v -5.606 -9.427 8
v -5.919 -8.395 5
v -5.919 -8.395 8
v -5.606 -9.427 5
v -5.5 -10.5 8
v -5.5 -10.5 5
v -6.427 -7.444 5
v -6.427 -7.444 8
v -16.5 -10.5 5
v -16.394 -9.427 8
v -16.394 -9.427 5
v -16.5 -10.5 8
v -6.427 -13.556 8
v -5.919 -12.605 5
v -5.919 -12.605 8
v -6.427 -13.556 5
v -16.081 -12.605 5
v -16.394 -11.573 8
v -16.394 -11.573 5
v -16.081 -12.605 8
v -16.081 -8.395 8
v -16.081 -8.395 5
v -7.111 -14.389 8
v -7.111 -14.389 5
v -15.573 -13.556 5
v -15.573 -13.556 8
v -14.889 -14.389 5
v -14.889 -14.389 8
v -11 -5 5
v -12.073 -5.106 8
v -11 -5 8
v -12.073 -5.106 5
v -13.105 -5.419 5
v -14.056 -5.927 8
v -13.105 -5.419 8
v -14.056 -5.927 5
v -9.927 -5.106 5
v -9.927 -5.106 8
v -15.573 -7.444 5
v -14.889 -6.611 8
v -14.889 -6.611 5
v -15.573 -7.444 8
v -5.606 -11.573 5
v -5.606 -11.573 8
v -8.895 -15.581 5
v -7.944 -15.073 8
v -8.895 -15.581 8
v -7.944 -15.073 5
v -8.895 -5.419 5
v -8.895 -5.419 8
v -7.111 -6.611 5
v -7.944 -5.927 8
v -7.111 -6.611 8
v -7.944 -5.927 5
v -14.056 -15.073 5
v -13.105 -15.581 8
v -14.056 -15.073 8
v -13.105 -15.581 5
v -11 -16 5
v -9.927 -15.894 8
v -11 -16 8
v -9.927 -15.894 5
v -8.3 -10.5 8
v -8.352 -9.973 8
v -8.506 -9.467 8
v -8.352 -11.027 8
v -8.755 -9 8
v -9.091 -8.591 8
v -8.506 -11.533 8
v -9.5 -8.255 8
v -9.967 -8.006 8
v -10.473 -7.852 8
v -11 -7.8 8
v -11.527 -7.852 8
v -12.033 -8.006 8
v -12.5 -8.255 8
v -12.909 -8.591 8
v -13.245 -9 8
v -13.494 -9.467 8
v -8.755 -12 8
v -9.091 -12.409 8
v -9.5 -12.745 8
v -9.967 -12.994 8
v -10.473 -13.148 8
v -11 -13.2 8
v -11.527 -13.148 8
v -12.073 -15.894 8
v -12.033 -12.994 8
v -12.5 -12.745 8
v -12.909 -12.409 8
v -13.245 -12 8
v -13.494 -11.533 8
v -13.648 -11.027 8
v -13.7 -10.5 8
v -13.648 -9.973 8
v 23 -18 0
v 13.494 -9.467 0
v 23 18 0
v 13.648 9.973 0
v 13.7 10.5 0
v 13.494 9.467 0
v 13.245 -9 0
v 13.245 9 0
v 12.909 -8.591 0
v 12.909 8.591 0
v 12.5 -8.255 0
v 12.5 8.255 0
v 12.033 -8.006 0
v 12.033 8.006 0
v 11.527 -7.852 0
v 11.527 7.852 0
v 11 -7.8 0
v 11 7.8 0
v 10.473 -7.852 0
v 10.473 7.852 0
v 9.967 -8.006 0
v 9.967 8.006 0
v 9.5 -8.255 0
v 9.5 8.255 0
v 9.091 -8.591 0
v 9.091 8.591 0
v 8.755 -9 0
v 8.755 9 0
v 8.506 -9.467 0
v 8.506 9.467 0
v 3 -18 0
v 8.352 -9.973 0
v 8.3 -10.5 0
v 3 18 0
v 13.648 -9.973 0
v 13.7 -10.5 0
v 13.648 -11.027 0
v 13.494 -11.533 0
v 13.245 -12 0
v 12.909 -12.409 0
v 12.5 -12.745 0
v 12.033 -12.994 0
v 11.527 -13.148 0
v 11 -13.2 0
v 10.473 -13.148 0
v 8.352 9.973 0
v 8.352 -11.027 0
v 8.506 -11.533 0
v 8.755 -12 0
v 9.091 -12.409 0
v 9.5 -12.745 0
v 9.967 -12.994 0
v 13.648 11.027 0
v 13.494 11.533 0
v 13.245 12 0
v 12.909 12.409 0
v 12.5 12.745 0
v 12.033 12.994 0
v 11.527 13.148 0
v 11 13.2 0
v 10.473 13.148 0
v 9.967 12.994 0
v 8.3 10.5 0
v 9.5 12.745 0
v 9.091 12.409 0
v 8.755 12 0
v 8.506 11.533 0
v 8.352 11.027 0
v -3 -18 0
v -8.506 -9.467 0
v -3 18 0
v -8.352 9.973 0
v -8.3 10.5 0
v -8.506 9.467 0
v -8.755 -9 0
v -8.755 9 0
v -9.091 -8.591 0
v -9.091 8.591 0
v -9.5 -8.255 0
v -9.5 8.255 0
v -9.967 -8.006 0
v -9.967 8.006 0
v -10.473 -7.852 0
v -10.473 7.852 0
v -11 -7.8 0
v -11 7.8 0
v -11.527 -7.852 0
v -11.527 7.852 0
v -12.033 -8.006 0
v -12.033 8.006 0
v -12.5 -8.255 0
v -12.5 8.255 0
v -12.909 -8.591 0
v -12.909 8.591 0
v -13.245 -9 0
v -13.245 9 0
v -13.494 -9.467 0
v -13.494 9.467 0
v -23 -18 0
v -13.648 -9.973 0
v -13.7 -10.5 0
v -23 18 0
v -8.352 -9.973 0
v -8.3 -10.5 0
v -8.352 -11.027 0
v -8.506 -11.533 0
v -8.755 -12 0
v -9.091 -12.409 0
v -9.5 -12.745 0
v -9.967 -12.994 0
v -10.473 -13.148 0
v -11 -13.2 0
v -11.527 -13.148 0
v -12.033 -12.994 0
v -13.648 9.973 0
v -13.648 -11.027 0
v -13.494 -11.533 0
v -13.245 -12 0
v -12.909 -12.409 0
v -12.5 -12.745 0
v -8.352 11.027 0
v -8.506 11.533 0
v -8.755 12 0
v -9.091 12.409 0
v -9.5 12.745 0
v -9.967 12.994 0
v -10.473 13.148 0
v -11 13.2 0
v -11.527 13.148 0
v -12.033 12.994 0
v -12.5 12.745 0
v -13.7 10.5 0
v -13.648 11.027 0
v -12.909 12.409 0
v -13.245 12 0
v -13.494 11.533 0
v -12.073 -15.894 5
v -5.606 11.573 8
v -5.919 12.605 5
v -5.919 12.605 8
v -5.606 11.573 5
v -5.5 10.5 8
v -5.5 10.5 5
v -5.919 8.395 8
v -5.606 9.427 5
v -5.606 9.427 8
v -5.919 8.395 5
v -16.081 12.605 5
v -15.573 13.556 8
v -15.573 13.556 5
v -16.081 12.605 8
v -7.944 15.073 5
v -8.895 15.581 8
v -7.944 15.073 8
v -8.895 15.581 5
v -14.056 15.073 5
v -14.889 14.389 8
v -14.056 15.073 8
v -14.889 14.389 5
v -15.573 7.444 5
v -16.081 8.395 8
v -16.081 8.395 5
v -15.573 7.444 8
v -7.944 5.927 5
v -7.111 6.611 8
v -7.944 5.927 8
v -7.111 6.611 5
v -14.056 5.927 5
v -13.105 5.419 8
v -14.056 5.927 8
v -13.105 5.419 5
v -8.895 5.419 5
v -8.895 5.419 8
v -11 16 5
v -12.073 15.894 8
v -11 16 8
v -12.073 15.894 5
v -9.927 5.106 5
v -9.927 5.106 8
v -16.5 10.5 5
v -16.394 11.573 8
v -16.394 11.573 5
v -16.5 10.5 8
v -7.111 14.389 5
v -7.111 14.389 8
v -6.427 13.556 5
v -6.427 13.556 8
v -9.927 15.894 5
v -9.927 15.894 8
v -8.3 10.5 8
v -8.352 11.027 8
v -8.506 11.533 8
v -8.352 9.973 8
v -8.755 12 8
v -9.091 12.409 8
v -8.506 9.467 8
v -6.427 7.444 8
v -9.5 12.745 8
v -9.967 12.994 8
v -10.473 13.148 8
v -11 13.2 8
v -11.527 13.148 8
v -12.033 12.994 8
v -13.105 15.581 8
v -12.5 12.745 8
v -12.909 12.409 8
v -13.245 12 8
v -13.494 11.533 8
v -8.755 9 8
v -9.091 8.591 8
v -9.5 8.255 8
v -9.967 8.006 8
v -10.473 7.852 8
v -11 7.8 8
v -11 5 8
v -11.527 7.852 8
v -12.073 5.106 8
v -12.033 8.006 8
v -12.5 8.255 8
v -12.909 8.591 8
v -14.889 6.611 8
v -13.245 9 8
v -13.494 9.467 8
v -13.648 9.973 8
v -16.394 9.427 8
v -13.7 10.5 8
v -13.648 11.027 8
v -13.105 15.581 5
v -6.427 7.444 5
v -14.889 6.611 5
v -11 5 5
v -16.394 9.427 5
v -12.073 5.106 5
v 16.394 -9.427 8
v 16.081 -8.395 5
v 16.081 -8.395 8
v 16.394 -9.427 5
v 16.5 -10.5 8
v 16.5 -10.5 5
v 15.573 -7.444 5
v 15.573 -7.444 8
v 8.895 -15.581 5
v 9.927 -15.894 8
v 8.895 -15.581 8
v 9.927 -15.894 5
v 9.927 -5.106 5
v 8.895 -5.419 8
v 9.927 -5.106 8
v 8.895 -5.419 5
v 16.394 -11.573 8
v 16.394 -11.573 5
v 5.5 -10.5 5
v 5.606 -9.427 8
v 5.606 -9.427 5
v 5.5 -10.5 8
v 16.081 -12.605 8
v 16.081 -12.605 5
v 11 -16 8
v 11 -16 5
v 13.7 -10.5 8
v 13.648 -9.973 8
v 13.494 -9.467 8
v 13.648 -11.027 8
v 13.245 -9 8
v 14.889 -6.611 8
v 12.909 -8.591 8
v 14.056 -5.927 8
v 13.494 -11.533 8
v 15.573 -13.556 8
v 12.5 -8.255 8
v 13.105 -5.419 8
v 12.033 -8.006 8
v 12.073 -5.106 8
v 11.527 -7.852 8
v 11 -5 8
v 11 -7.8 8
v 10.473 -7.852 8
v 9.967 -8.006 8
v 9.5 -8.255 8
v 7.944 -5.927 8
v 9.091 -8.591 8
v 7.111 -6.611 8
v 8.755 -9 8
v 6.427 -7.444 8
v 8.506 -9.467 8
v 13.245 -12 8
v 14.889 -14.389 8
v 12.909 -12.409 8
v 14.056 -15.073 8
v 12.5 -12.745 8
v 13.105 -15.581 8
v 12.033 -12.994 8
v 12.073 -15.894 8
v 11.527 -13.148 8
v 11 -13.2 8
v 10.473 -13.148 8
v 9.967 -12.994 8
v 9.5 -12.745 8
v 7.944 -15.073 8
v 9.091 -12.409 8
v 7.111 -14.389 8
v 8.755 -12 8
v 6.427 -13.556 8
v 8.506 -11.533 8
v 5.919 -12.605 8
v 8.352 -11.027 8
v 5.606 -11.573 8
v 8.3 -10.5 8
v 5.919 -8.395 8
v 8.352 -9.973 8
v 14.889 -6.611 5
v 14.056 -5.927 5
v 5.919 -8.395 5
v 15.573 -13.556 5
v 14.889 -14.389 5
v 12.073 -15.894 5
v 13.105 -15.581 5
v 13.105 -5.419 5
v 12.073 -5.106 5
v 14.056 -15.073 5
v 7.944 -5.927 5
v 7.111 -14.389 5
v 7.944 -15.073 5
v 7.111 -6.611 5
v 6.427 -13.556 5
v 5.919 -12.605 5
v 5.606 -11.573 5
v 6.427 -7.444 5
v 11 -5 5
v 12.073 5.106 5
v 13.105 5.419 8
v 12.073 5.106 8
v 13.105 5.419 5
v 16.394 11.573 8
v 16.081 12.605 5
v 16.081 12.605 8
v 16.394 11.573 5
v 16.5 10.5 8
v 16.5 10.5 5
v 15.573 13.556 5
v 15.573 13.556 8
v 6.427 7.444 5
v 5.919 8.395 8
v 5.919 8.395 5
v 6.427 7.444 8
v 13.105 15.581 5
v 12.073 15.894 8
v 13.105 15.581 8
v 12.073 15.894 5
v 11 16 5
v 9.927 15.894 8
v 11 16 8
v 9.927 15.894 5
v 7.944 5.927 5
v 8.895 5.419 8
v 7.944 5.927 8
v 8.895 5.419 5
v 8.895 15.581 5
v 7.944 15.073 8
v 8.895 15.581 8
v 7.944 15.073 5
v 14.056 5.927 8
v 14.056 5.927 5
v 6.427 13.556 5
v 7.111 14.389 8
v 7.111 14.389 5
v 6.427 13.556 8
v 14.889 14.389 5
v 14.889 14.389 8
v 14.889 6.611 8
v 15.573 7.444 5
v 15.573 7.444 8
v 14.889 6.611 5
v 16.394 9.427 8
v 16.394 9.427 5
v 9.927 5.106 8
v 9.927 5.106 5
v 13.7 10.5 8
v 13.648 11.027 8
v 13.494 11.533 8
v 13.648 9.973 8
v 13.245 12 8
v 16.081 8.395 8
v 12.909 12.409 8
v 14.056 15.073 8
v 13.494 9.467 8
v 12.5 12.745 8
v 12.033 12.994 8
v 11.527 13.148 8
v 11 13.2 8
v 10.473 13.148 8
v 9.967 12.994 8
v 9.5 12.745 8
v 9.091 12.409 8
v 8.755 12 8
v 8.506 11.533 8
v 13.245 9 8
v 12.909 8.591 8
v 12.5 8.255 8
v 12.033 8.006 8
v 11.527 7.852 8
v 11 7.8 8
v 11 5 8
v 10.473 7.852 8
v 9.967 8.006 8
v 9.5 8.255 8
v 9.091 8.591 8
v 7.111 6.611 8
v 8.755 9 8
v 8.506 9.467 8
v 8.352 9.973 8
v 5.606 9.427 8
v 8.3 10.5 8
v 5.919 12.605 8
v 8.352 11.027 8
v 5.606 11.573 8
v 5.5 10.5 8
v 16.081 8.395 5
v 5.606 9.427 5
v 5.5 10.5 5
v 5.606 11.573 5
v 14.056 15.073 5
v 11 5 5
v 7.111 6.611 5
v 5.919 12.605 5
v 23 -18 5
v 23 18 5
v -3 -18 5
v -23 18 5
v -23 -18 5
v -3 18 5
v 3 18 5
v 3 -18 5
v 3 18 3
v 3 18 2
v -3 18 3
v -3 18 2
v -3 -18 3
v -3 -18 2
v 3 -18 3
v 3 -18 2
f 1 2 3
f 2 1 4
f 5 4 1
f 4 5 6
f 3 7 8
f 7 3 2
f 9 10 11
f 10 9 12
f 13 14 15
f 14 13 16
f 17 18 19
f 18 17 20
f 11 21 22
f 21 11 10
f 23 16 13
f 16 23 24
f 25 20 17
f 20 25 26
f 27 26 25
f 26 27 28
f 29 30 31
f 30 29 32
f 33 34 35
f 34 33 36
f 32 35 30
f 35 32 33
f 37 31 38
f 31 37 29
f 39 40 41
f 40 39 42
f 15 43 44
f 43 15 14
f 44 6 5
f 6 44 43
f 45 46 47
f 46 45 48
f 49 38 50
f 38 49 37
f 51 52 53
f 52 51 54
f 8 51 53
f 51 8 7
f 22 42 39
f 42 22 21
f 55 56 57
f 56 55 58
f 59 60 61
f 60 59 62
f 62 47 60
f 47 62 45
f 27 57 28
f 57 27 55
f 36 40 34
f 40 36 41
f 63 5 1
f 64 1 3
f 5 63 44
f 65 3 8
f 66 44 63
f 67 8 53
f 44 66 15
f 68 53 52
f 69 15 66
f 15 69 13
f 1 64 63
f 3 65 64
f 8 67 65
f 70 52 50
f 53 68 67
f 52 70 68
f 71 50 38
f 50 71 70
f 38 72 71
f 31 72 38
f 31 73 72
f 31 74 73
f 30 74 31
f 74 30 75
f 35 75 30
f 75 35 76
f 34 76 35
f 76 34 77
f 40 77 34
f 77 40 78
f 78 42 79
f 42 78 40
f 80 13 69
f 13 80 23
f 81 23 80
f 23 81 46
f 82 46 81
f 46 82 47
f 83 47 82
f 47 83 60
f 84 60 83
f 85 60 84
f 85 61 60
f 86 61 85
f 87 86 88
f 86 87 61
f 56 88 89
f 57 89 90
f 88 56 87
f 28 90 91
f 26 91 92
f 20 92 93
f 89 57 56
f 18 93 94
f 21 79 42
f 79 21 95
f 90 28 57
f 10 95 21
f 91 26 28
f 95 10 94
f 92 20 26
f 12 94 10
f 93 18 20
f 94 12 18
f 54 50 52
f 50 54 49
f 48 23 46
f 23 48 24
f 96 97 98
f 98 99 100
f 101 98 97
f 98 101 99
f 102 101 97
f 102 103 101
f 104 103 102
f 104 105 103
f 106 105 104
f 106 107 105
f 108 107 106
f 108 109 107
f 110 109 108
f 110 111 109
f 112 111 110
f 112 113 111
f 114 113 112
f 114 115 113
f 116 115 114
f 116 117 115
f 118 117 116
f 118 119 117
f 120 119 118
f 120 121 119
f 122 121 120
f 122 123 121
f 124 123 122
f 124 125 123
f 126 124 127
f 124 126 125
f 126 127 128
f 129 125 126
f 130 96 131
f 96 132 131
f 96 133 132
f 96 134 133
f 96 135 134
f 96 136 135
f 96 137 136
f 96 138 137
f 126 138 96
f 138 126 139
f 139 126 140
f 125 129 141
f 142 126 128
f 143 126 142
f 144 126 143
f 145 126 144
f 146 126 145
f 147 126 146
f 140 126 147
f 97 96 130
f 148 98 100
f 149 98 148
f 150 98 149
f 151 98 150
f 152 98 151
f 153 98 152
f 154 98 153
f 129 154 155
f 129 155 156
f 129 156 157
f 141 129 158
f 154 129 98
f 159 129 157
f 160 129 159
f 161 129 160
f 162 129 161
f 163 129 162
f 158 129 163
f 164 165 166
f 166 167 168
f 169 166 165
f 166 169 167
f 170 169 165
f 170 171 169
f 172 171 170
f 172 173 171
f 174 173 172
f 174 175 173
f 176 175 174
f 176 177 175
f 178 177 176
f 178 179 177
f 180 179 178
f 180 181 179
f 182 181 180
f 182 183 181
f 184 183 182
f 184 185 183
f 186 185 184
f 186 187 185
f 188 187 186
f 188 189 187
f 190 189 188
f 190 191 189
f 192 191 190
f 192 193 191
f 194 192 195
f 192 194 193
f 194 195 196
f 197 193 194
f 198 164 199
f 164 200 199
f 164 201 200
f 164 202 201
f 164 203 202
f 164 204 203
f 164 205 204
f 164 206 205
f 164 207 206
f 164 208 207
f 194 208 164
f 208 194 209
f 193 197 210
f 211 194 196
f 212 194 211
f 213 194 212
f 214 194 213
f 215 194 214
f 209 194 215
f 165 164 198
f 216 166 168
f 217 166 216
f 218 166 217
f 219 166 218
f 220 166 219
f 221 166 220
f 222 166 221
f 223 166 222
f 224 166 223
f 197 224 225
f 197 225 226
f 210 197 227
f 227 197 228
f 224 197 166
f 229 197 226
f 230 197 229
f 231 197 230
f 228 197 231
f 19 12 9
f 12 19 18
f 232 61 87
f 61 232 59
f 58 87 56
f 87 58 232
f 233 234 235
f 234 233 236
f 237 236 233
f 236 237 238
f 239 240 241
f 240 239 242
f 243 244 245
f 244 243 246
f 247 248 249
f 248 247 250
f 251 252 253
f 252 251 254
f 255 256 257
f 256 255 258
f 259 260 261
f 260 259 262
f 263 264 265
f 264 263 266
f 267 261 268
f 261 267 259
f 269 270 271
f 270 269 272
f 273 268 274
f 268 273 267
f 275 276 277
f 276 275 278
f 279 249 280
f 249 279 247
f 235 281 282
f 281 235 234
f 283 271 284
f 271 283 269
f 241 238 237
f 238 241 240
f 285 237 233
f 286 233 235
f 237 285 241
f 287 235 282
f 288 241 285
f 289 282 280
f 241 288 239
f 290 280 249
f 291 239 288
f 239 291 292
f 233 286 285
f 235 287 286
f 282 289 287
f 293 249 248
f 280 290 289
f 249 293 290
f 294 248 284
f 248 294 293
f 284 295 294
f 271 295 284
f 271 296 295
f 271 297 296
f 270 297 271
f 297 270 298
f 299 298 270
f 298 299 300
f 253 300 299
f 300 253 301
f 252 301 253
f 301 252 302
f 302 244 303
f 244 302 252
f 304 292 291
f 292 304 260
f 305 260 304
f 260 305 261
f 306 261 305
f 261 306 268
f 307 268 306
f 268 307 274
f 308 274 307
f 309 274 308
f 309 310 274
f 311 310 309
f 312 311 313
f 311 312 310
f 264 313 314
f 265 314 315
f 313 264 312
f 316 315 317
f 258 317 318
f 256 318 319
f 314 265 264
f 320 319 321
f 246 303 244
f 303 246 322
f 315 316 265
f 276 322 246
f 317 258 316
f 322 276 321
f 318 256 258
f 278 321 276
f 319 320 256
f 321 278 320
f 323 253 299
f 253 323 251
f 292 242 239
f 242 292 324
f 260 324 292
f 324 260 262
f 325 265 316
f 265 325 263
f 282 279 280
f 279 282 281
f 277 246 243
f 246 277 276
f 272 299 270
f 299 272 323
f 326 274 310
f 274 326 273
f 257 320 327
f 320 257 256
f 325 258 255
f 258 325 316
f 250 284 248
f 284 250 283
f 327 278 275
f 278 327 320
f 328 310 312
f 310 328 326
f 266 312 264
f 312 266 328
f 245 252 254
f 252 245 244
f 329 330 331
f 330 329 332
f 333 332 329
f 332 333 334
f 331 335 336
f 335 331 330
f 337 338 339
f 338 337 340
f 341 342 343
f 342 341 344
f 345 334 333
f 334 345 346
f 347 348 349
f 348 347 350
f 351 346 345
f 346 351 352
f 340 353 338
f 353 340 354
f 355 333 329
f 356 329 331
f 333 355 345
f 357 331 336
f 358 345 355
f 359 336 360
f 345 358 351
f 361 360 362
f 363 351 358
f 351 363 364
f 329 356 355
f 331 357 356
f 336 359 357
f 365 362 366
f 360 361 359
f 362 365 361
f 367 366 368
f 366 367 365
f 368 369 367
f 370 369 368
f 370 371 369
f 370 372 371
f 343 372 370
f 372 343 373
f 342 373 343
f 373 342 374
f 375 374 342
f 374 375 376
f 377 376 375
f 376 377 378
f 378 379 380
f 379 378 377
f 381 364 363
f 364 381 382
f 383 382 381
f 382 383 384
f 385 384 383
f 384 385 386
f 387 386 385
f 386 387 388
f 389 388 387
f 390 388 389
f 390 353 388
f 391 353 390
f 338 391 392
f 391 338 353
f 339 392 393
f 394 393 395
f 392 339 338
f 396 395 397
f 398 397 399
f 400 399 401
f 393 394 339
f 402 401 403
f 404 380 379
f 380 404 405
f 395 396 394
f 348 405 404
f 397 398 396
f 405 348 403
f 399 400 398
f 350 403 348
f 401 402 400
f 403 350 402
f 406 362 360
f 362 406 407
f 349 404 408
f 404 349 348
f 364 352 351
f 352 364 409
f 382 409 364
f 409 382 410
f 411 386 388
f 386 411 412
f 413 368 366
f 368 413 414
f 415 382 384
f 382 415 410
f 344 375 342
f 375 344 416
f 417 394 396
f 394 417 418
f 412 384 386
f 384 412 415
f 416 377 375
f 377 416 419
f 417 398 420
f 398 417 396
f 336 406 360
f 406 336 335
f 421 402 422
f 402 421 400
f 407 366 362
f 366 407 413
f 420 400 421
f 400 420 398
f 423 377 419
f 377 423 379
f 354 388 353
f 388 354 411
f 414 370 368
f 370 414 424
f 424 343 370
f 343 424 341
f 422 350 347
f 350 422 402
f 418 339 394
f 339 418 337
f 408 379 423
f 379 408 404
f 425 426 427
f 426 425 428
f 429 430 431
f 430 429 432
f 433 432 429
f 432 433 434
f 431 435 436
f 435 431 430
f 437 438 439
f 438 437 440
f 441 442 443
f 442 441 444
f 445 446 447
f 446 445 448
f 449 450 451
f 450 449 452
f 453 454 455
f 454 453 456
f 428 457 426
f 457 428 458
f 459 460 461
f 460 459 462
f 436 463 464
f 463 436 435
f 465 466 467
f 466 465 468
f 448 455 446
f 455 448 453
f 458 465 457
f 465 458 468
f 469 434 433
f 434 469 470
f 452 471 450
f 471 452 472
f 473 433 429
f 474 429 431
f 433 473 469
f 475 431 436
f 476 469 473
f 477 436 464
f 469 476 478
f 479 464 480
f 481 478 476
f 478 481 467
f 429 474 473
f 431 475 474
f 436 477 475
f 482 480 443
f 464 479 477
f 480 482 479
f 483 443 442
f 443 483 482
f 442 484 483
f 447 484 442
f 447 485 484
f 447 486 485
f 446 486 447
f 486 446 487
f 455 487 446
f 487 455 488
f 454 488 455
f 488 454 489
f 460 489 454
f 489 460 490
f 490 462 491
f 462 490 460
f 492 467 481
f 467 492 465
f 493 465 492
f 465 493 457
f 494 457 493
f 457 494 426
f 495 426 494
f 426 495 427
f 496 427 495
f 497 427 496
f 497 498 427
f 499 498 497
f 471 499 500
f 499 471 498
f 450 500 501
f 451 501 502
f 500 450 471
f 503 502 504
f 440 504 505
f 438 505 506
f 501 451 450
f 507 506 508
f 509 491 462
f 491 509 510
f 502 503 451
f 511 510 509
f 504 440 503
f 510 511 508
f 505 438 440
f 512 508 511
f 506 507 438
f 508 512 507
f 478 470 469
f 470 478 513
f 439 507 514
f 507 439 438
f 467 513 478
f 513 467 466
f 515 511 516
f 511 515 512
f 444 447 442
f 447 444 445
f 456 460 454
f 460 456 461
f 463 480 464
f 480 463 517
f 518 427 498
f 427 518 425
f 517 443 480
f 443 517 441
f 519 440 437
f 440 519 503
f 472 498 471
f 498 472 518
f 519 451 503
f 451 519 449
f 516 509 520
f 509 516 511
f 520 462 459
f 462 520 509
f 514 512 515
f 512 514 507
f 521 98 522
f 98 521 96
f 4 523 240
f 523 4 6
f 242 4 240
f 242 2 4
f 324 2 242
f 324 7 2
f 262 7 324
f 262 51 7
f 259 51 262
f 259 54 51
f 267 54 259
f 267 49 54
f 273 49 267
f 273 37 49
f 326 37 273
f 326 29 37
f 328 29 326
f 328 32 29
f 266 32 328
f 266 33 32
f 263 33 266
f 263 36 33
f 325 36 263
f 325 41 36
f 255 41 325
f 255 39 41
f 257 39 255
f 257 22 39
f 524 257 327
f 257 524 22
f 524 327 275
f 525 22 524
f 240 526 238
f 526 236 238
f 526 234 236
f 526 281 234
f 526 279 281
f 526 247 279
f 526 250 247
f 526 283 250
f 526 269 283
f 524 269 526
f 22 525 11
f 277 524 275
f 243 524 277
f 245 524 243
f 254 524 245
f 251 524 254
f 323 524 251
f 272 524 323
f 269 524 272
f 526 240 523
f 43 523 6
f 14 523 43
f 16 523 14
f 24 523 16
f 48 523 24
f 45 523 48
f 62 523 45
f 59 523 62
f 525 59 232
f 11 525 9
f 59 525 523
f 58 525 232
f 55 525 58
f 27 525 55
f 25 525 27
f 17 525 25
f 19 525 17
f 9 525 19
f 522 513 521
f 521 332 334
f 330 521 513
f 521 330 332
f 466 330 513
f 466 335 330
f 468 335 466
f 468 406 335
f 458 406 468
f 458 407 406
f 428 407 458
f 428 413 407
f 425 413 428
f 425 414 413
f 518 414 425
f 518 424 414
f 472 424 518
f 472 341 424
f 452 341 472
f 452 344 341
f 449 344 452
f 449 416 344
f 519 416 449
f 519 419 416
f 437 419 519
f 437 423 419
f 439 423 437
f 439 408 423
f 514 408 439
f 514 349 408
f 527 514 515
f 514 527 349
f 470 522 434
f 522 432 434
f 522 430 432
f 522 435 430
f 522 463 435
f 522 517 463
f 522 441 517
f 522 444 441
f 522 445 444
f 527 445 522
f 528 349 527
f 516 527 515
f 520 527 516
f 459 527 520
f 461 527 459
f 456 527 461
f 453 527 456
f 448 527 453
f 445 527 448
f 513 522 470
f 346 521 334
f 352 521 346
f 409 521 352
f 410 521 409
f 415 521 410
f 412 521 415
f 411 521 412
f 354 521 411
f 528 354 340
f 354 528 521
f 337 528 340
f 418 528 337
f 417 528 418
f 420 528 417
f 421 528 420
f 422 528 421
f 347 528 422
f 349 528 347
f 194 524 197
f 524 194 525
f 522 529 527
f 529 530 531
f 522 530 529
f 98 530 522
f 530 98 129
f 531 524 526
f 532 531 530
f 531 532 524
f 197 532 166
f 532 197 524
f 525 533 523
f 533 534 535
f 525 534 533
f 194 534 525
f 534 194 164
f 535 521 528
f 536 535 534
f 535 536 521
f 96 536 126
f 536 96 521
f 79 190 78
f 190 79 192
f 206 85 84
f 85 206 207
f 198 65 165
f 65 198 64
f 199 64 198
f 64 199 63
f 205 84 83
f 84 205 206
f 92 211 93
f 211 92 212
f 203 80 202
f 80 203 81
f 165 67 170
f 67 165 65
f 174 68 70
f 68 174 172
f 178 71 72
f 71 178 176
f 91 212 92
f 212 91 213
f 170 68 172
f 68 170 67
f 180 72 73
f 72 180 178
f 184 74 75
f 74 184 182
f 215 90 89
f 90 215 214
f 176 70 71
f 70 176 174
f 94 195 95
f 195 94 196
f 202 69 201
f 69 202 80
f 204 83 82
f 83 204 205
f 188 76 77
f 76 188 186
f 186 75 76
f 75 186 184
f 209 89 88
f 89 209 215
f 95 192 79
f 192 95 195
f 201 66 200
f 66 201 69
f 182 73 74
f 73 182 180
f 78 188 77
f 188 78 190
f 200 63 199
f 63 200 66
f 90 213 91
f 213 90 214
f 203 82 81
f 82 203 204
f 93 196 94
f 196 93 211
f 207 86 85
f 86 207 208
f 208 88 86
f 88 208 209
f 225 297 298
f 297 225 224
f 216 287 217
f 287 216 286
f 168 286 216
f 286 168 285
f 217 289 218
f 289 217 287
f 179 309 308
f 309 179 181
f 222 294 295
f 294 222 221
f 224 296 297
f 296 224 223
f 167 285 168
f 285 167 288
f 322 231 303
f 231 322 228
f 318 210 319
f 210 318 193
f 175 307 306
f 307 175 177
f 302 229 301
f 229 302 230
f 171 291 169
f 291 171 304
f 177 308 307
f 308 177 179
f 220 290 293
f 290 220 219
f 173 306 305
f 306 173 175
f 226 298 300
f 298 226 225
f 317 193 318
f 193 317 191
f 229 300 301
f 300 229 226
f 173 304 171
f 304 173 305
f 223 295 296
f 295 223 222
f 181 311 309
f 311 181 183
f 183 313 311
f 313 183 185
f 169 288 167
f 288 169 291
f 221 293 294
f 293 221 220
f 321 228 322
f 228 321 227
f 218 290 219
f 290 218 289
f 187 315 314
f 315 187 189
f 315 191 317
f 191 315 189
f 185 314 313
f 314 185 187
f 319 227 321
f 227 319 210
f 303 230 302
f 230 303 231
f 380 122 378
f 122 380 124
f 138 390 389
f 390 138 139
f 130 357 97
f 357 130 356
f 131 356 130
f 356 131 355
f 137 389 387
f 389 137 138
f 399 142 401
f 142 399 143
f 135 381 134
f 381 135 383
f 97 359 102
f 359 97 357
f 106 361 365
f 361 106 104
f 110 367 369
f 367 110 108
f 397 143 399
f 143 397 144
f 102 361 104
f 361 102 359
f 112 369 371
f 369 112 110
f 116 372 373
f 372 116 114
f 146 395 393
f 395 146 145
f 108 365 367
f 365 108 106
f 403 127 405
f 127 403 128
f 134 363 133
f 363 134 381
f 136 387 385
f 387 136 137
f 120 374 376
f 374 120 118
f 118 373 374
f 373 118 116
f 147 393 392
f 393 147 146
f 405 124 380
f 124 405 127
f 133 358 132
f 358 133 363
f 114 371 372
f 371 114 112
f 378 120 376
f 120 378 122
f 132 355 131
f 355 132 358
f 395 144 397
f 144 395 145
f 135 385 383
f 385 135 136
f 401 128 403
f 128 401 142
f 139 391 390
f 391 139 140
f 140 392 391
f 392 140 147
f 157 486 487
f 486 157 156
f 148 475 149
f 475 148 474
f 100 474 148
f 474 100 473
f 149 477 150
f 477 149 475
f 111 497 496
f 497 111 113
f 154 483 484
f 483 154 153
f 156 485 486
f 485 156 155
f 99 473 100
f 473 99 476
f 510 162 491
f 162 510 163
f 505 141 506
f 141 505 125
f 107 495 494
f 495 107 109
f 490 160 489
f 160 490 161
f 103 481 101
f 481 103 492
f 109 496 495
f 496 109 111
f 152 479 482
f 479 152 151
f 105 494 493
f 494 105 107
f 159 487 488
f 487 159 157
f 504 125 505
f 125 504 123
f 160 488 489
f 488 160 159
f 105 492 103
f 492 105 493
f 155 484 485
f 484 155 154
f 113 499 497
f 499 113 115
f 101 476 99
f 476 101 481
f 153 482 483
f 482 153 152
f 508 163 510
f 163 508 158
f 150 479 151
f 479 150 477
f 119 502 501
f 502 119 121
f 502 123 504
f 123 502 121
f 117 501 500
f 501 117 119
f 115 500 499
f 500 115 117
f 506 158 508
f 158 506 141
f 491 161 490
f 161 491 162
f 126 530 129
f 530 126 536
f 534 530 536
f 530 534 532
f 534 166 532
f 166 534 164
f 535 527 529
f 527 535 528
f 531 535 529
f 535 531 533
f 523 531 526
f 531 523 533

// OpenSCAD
$fn = 32;

// ----------------------------------------------------------------------
// Living hinge: 46 x 36 mm plates, 1 mm flexible web
// ----------------------------------------------------------------------

// --- parameters (mm) ---
plate_len = 20;           // plate length outside the web
plate_w = 36;             // plate width
thick = 5;                // plate thickness
web_half = 3;             // half width of the flex band
web_t = 1;                // flexible web thickness
web_z = 2;                // web position inside the thickness
boss_d = 11;              // screw boss diameter
boss_h = 8;               // screw boss height
boss_x = 11;              // screw boss distance from the web
screw_d = 5.4;            // screw hole

difference() {
  union() {
    /* one flat strip, later thinned at the middle */
    translate([-23, -18, 0]) cube([46, 36, 5]);
    /* screw bosses, sunk 0.5 mm into the plates */
    for (sx = [-11, 11]) {
      for (sy = [-10.5, 10.5]) {
        translate([sx, sy, 0]) cylinder(h = boss_h, d = boss_d);
      }
    }
  }
  /* channel from below: leaves the web on top of it */
  translate([-3, -20.5, -2.5]) cube([6, 41, 4.5]);
  /* channel from above: thins the web down to web_t */
  translate([-3, -20.5, 3]) cube([6, 41, 4.5]);
  /* screw holes through the bosses */
  for (sx = [-11, 11]) {
    for (sy = [-10.5, 10.5]) {
      translate([sx, sy, -2.5]) cylinder(h = boss_h + 5, d = screw_d);
    }
  }
}
